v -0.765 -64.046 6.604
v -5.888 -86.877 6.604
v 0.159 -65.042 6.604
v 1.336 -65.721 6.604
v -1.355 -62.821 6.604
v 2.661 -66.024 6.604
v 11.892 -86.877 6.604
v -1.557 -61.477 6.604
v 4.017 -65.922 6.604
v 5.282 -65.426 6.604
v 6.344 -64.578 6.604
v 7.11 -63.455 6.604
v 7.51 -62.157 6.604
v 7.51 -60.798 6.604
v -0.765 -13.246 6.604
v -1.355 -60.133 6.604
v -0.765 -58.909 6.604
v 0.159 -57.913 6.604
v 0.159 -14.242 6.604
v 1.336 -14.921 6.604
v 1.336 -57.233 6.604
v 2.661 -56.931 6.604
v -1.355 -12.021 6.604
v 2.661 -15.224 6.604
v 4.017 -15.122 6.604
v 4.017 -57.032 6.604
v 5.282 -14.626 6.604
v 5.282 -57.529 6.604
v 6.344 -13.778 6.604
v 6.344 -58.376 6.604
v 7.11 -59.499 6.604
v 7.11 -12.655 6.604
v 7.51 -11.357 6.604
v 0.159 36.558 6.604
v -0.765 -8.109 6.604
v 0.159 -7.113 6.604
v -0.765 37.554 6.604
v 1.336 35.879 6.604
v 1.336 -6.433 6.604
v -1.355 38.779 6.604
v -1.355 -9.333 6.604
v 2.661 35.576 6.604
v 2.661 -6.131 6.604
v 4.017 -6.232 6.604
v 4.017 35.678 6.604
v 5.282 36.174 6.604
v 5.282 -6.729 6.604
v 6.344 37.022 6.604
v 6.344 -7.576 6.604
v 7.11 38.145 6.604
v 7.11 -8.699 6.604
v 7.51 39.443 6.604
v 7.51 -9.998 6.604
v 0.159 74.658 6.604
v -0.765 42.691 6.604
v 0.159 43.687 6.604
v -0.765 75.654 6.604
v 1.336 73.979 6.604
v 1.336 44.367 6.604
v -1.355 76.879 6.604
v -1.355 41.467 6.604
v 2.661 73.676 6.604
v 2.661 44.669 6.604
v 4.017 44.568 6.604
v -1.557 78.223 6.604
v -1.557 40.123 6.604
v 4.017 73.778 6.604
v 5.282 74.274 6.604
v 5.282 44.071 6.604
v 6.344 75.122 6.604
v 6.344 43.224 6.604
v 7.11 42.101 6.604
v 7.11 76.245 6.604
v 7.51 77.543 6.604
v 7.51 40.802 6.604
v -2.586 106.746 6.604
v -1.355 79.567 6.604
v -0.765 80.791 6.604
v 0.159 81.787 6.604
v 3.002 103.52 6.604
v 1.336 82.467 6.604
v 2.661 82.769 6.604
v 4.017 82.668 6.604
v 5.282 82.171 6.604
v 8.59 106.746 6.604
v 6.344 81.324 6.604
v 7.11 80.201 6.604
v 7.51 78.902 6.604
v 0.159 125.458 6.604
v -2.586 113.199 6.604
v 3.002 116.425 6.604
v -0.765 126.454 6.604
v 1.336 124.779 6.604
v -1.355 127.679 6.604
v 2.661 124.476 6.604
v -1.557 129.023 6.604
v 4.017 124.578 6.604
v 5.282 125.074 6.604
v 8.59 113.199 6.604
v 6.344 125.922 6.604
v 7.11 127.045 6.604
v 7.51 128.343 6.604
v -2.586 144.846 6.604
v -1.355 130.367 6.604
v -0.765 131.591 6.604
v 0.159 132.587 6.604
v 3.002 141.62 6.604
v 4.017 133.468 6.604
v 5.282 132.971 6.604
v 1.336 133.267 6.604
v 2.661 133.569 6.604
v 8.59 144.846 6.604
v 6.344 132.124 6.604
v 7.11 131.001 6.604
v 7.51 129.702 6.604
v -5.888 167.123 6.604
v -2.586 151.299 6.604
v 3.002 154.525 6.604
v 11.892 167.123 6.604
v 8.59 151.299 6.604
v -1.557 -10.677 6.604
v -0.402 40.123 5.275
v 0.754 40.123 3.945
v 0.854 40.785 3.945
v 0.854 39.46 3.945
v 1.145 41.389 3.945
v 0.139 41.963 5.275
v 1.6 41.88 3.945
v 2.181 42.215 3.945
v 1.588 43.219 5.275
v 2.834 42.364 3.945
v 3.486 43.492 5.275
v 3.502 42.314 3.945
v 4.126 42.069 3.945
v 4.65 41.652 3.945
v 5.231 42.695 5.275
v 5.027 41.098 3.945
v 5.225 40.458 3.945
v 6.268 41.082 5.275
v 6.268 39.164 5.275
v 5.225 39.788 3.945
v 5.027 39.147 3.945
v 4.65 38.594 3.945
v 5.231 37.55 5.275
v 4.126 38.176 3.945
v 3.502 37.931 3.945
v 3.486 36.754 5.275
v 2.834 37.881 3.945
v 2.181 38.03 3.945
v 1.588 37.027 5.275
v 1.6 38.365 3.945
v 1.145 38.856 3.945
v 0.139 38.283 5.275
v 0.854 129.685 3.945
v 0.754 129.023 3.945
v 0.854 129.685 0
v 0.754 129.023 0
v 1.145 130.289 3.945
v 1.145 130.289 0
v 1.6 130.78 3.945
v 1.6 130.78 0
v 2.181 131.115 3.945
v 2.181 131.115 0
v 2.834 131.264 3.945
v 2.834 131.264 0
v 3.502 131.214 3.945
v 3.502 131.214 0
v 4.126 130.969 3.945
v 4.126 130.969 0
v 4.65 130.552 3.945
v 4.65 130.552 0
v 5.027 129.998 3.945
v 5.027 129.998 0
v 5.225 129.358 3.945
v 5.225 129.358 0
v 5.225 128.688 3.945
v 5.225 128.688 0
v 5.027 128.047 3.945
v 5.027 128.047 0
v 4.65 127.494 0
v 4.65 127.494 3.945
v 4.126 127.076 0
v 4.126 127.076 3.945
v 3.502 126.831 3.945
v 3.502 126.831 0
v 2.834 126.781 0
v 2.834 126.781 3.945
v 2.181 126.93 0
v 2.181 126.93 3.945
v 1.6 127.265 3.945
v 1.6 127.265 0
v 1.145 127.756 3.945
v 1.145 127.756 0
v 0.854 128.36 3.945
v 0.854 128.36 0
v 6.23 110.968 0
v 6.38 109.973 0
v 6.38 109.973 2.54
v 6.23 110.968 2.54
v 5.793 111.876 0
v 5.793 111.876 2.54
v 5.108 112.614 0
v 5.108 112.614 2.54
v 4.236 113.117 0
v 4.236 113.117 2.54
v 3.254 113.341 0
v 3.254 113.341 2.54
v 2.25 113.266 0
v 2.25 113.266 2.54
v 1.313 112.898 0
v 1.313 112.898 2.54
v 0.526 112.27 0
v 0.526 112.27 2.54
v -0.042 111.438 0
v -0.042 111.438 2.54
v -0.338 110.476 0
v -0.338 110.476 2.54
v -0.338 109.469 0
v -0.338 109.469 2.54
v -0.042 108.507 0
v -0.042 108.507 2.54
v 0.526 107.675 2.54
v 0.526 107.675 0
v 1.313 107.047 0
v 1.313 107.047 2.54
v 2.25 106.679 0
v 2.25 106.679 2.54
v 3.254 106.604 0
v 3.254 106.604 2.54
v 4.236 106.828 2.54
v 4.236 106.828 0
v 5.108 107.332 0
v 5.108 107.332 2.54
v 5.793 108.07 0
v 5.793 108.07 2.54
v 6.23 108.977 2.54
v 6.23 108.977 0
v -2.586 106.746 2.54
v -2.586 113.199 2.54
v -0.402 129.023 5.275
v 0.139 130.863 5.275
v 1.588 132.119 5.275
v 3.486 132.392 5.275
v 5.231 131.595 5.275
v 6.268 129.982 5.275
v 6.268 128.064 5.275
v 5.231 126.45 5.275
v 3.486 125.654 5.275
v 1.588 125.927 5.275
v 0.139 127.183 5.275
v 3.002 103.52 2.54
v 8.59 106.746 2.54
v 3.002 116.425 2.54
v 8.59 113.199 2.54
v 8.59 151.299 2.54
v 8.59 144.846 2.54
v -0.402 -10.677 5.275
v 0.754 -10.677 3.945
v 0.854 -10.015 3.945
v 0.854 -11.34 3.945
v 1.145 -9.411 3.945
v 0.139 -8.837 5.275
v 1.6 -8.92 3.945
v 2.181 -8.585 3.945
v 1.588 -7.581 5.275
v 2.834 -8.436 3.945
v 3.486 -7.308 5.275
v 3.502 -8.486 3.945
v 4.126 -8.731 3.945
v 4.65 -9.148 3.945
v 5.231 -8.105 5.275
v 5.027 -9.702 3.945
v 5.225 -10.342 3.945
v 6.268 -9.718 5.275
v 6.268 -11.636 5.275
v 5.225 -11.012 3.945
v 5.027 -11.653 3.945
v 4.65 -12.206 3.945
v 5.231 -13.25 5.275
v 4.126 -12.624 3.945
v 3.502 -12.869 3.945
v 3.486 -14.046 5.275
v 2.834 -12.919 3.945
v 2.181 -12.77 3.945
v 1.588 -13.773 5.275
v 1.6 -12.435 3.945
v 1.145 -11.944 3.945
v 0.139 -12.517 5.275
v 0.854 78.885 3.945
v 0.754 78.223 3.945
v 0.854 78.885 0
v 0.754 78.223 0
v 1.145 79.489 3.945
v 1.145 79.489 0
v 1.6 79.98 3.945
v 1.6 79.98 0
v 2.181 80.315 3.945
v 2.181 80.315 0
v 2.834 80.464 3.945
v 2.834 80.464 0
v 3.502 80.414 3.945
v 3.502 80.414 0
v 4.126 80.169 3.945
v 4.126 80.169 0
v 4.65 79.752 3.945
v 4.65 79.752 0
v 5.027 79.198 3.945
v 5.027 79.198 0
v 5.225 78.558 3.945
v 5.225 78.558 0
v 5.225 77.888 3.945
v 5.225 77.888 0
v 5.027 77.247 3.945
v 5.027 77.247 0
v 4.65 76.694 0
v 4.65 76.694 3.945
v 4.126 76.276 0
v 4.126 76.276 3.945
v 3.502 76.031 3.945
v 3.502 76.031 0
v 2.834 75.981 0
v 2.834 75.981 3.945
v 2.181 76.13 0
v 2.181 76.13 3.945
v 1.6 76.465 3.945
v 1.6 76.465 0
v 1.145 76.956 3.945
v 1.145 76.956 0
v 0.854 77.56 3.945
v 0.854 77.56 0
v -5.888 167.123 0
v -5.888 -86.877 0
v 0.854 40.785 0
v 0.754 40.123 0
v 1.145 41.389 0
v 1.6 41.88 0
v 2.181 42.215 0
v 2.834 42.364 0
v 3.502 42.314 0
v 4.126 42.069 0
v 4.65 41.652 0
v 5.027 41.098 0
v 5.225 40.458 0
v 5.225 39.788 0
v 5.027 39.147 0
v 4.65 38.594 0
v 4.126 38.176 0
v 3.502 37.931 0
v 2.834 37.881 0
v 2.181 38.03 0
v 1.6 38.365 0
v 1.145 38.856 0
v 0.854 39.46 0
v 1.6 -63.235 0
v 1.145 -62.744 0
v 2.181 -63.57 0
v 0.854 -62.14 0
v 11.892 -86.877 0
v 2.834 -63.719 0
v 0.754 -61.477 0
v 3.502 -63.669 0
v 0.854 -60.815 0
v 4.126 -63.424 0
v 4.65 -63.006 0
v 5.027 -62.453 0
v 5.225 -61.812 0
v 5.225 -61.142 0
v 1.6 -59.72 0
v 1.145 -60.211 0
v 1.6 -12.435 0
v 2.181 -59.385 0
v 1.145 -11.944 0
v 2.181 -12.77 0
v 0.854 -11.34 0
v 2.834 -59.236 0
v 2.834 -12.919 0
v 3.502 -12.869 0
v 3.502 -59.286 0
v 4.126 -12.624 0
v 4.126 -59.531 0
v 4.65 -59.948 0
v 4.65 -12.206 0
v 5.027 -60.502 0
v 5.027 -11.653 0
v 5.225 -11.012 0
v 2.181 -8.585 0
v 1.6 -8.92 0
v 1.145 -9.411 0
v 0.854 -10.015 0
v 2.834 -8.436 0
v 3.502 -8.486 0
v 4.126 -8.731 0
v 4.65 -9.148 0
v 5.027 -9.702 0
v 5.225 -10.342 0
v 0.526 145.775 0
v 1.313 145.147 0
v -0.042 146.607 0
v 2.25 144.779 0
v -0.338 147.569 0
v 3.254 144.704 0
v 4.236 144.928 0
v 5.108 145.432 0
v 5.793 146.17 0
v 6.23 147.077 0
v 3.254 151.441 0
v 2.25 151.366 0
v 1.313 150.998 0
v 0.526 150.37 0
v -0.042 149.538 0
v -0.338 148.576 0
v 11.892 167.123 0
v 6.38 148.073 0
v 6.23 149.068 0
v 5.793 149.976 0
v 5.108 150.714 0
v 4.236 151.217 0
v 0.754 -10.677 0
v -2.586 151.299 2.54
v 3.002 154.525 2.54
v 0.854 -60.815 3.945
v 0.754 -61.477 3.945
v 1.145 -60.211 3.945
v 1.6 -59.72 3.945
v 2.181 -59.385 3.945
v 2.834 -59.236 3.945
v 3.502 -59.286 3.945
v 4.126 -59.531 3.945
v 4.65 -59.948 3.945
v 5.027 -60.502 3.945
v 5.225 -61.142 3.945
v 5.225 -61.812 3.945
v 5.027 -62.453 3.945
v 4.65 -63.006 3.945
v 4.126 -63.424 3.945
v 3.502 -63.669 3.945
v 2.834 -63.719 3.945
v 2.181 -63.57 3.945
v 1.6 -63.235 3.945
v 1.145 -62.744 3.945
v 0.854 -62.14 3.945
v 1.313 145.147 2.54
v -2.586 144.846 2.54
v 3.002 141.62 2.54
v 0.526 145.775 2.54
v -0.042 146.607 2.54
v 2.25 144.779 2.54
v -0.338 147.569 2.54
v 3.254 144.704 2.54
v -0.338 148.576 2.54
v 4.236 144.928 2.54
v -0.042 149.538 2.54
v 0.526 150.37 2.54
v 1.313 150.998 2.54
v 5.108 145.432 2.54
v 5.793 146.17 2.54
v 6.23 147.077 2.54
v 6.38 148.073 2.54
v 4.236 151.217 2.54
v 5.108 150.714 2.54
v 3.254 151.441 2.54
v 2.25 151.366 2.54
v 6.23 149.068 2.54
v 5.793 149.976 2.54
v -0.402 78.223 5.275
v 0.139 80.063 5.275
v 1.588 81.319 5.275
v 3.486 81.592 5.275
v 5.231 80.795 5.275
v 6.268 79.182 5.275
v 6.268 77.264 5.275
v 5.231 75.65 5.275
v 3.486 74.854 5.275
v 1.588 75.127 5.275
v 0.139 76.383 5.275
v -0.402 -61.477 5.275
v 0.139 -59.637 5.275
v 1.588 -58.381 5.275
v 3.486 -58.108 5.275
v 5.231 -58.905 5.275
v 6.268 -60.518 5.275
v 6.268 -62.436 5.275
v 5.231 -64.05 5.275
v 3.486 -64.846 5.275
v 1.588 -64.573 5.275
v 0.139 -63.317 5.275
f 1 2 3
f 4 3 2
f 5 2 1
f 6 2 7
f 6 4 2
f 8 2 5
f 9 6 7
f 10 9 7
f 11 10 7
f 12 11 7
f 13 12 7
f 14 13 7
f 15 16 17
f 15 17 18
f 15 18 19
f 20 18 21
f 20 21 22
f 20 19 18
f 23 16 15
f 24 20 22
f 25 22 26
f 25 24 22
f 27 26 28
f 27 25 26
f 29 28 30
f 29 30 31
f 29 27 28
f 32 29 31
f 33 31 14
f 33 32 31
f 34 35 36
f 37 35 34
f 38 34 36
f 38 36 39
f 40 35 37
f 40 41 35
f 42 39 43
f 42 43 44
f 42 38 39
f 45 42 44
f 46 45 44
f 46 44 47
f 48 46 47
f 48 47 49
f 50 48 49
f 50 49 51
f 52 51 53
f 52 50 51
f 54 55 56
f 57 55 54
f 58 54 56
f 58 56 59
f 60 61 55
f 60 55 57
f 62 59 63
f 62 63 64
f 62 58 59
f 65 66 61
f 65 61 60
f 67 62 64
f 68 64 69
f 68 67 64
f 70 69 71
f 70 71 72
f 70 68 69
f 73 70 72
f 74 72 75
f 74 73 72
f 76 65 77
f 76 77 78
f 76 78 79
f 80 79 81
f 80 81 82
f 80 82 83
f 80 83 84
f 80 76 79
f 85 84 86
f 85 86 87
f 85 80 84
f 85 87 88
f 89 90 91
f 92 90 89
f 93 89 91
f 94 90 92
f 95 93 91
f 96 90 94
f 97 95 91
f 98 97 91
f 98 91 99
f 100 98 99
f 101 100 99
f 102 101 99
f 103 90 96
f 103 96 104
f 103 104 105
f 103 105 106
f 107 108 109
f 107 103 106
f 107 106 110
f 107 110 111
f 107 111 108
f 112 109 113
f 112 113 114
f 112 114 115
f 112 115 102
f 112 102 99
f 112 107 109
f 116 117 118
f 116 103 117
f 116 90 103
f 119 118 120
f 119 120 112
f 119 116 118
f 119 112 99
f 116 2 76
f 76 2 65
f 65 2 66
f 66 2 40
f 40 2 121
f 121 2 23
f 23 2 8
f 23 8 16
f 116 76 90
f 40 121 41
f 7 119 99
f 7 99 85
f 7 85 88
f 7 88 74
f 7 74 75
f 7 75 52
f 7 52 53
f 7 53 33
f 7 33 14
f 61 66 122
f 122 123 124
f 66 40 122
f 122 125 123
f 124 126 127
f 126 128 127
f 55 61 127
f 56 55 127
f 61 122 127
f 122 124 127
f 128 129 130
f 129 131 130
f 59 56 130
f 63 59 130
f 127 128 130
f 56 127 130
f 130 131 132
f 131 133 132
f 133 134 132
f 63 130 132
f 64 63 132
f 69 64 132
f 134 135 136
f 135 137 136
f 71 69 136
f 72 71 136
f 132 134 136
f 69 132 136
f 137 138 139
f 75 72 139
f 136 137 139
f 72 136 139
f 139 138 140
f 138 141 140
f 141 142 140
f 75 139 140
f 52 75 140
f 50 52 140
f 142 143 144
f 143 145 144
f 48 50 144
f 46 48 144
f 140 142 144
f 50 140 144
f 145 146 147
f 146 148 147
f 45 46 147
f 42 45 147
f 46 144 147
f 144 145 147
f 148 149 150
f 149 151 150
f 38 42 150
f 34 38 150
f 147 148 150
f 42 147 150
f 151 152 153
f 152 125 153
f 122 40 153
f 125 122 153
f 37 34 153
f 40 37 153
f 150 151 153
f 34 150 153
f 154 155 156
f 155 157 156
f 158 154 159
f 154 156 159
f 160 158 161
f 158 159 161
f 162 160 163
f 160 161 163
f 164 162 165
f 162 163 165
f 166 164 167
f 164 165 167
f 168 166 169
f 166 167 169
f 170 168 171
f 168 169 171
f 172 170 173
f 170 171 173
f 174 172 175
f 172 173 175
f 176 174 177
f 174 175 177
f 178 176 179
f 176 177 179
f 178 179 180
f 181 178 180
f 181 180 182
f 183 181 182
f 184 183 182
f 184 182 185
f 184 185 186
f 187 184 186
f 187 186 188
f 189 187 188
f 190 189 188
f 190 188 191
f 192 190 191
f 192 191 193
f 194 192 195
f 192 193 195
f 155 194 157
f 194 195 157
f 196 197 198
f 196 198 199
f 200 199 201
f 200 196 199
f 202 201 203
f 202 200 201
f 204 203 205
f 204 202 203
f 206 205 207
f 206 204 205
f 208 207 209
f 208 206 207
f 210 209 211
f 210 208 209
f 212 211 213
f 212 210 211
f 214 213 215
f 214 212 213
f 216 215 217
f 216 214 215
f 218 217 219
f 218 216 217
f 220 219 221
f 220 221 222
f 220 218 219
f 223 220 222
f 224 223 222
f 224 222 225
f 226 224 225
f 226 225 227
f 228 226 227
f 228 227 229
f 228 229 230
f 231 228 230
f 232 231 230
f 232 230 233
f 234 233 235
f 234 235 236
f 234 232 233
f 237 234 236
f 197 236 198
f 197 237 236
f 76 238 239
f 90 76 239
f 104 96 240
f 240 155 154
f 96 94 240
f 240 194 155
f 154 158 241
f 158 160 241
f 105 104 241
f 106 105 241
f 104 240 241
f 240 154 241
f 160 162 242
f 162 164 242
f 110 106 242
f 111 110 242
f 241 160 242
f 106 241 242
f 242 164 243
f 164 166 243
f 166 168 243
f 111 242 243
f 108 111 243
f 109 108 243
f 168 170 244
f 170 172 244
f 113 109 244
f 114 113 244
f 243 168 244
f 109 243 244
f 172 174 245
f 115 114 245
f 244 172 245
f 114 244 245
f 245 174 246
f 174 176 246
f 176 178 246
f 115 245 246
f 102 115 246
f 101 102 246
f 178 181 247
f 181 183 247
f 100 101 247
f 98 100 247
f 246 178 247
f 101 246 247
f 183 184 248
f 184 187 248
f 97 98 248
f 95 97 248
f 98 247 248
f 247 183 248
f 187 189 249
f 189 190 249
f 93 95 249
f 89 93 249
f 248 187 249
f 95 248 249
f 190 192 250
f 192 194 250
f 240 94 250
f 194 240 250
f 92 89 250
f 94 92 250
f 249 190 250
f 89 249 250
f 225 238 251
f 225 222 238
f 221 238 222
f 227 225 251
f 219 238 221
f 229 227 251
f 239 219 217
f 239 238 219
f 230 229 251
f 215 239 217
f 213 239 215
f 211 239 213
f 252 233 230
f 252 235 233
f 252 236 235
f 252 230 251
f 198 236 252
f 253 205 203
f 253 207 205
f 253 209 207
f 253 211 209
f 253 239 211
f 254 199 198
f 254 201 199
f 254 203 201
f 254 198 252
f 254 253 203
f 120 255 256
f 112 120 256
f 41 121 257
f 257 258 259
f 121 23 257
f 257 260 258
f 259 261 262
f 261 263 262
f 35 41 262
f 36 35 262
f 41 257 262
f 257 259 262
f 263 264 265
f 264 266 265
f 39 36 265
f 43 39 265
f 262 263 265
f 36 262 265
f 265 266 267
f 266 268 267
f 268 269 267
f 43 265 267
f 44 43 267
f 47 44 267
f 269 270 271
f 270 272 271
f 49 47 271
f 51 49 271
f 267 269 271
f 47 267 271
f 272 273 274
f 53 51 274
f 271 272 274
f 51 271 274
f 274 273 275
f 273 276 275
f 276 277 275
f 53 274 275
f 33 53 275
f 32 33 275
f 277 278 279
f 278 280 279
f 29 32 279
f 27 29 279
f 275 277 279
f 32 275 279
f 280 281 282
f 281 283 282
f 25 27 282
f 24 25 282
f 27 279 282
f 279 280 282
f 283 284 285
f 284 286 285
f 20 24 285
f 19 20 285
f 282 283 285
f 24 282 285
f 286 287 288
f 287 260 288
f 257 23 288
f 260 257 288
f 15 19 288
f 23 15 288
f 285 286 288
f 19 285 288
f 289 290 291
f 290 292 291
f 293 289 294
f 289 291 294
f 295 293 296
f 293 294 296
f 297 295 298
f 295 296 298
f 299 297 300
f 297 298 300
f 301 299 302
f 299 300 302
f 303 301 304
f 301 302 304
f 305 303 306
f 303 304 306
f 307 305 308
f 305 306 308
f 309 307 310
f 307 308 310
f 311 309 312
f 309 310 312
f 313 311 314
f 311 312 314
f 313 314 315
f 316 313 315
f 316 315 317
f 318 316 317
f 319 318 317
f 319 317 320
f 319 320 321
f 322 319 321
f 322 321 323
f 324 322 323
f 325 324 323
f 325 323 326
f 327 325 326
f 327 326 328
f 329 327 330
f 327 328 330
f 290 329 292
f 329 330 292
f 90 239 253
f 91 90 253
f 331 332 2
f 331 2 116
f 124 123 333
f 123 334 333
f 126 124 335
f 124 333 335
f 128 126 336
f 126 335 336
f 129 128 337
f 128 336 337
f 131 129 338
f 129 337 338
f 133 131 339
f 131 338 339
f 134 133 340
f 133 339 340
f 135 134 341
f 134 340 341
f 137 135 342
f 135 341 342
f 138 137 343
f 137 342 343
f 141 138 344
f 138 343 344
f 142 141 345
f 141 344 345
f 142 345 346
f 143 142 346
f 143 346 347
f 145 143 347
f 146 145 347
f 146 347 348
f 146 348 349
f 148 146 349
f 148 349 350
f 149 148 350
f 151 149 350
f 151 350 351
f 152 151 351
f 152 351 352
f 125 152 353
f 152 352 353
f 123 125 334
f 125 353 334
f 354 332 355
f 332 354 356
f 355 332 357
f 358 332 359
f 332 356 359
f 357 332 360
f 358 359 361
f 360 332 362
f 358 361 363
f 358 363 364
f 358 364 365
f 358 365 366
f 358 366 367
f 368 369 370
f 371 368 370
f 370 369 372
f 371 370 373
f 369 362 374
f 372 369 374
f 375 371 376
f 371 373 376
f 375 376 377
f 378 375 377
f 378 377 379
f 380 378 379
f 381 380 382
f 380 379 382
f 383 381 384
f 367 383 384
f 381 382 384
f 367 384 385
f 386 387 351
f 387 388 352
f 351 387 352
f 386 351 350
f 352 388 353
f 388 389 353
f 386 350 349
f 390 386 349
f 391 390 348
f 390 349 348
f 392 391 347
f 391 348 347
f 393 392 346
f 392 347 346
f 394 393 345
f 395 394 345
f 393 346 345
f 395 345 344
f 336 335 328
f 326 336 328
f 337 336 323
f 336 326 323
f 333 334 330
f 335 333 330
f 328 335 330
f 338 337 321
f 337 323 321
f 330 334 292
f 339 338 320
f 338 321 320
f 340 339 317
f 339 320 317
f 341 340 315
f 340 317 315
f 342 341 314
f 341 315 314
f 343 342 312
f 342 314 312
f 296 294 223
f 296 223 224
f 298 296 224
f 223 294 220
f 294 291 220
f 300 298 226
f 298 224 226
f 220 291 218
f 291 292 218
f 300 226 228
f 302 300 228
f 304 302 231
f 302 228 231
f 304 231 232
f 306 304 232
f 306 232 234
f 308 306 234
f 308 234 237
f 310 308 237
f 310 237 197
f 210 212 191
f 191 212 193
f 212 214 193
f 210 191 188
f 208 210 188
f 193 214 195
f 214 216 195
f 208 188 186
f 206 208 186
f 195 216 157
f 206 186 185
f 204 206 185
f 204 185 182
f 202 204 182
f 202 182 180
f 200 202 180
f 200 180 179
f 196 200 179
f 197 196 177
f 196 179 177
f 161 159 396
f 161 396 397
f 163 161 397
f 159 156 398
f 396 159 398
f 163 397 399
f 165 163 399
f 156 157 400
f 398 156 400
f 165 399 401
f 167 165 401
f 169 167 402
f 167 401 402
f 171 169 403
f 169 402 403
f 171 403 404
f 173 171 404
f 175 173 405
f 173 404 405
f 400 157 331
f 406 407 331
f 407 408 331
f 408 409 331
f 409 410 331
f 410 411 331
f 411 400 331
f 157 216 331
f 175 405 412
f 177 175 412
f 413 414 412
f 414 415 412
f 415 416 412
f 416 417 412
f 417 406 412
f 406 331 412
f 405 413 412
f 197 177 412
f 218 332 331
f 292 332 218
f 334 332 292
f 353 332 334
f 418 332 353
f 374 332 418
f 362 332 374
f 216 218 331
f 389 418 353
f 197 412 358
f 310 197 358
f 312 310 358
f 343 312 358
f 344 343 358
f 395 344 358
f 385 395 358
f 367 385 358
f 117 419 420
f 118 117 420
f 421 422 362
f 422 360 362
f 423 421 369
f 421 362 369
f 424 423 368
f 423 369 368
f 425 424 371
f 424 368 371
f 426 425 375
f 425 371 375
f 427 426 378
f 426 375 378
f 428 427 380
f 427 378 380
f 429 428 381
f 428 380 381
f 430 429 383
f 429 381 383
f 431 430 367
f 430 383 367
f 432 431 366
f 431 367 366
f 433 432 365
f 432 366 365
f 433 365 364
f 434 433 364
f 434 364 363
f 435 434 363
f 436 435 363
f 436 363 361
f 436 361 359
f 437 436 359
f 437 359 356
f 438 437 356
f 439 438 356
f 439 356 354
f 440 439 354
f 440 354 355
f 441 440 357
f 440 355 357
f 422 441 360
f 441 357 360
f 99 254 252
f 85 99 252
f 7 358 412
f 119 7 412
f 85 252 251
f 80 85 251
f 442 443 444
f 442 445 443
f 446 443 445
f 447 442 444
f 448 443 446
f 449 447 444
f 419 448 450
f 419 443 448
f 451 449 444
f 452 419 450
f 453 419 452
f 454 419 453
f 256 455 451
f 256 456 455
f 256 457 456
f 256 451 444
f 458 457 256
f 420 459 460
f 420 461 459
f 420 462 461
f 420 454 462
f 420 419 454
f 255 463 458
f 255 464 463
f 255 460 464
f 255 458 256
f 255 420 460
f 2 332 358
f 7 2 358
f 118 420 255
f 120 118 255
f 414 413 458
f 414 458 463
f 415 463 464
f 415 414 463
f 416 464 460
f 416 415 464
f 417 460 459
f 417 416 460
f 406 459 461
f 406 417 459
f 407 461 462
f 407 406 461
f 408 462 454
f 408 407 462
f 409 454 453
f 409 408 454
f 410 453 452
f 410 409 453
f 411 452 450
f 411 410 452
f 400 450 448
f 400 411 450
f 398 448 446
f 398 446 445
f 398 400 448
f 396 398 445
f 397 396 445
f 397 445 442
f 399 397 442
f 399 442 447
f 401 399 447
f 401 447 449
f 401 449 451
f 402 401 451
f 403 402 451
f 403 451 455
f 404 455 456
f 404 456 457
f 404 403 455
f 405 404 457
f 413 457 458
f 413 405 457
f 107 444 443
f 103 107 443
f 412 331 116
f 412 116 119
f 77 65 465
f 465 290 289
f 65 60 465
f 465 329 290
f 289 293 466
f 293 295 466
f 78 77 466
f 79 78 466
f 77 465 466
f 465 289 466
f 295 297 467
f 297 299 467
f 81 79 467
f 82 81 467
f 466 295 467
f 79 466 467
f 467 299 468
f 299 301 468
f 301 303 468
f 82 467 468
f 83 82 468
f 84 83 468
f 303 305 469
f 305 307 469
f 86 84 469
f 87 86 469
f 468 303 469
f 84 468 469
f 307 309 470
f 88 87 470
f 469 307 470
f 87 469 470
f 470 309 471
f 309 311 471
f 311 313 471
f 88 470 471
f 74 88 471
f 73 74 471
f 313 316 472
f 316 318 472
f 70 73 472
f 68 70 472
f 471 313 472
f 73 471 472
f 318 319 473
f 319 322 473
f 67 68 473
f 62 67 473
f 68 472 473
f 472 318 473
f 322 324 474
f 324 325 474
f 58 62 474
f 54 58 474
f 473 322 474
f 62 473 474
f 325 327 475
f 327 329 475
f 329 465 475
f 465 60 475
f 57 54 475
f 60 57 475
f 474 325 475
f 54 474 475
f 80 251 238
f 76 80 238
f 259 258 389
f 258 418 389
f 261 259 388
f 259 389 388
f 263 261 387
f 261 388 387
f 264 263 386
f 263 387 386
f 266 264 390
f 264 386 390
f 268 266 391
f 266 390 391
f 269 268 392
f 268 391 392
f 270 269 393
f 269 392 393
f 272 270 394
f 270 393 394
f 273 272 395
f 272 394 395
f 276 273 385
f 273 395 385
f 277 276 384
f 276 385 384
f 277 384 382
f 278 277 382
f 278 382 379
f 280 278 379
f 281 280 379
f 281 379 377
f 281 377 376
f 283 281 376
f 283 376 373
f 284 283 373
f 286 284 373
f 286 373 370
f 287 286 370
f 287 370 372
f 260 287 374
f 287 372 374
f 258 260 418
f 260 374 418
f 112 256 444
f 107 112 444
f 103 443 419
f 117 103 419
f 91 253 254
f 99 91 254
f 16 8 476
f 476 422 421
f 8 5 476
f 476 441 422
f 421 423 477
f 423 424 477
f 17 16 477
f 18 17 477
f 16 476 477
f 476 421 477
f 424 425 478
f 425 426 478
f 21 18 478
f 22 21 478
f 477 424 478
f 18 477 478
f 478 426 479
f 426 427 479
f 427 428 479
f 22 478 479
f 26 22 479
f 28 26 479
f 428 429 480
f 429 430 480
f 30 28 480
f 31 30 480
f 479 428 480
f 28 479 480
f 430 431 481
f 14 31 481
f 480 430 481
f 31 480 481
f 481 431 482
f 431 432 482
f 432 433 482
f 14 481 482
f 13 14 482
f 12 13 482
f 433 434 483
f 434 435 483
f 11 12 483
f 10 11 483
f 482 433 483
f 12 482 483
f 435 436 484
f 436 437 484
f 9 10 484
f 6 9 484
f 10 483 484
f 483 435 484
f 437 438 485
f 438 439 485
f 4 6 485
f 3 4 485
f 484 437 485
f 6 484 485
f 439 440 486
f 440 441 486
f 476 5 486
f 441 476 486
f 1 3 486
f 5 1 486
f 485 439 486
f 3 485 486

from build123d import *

# Parameters (mm, degrees)
F0_W           = 17.78
F0_H           = 254
F1_DEPTH       = 6.604
F0_R           = 3.3782
F2_DEPTH       = 2.54
F4_D           = 4.4958
F4_CSINK_D     = 9.1186
F4_CSINK_ANGLE = 82


with BuildPart() as f1:
    # F0 (on Top) → F1 (new body)
    with BuildSketch(Plane.XY):
        with Locations((3.0019969136, 40.122719574)):
            Rectangle(F0_W, F0_H)
        Polygon((8.5899969136, 113.1989528782), (8.5899969136, 106.7464862697), (3.0019969136, 103.5202529655), (-2.5860030864, 106.7464862697), (-2.5860030864, 113.1989528782), (3.0019969136, 116.4251861824), align=None, mode=Mode.SUBTRACT)
        Polygon((3.0019969136, 154.5251861824), (8.5899969136, 151.2989528782), (8.5899969136, 144.8464862697), (3.0019969136, 141.6202529655), (-2.5860030864, 144.8464862697), (-2.5860030864, 151.2989528782), align=None, mode=Mode.SUBTRACT)
    extrude(amount=F1_DEPTH)

    # F0 (on Top) → F2 (join)
    with BuildSketch(Plane.XY):
        Polygon((3.0019969136, 103.5202529655), (8.5899969136, 106.7464862697), (8.5899969136, 113.1989528782), (3.0019969136, 116.4251861824), (-2.5860030864, 113.1989528782), (-2.5860030864, 106.7464862697), align=None)
        with Locations((3.0019969136, 109.972719574)):
            Circle(F0_R, mode=Mode.SUBTRACT)
        Polygon((8.5899969136, 144.8464862697), (8.5899969136, 151.2989528782), (3.0019969136, 154.5251861824), (-2.5860030864, 151.2989528782), (-2.5860030864, 144.8464862697), (3.0019969136, 141.6202529655), align=None)
        with Locations((3.0019969136, 148.072719574)):
            Circle(F0_R, mode=Mode.SUBTRACT)
    extrude(amount=F2_DEPTH)

    # F4 (through all)
    with Locations(Plane.XY.offset(6.604)):
        with Locations((3.0019969136, 129.022719574), (3.0019969136, 78.222719574), (3.0019969136, 40.122719574), (3.0019969136, -10.677280426), (3.0019969136, -61.477280426)):
            CounterSinkHole(F4_D / 2, F4_CSINK_D / 2, counter_sink_angle=F4_CSINK_ANGLE)


solid = f1.part
